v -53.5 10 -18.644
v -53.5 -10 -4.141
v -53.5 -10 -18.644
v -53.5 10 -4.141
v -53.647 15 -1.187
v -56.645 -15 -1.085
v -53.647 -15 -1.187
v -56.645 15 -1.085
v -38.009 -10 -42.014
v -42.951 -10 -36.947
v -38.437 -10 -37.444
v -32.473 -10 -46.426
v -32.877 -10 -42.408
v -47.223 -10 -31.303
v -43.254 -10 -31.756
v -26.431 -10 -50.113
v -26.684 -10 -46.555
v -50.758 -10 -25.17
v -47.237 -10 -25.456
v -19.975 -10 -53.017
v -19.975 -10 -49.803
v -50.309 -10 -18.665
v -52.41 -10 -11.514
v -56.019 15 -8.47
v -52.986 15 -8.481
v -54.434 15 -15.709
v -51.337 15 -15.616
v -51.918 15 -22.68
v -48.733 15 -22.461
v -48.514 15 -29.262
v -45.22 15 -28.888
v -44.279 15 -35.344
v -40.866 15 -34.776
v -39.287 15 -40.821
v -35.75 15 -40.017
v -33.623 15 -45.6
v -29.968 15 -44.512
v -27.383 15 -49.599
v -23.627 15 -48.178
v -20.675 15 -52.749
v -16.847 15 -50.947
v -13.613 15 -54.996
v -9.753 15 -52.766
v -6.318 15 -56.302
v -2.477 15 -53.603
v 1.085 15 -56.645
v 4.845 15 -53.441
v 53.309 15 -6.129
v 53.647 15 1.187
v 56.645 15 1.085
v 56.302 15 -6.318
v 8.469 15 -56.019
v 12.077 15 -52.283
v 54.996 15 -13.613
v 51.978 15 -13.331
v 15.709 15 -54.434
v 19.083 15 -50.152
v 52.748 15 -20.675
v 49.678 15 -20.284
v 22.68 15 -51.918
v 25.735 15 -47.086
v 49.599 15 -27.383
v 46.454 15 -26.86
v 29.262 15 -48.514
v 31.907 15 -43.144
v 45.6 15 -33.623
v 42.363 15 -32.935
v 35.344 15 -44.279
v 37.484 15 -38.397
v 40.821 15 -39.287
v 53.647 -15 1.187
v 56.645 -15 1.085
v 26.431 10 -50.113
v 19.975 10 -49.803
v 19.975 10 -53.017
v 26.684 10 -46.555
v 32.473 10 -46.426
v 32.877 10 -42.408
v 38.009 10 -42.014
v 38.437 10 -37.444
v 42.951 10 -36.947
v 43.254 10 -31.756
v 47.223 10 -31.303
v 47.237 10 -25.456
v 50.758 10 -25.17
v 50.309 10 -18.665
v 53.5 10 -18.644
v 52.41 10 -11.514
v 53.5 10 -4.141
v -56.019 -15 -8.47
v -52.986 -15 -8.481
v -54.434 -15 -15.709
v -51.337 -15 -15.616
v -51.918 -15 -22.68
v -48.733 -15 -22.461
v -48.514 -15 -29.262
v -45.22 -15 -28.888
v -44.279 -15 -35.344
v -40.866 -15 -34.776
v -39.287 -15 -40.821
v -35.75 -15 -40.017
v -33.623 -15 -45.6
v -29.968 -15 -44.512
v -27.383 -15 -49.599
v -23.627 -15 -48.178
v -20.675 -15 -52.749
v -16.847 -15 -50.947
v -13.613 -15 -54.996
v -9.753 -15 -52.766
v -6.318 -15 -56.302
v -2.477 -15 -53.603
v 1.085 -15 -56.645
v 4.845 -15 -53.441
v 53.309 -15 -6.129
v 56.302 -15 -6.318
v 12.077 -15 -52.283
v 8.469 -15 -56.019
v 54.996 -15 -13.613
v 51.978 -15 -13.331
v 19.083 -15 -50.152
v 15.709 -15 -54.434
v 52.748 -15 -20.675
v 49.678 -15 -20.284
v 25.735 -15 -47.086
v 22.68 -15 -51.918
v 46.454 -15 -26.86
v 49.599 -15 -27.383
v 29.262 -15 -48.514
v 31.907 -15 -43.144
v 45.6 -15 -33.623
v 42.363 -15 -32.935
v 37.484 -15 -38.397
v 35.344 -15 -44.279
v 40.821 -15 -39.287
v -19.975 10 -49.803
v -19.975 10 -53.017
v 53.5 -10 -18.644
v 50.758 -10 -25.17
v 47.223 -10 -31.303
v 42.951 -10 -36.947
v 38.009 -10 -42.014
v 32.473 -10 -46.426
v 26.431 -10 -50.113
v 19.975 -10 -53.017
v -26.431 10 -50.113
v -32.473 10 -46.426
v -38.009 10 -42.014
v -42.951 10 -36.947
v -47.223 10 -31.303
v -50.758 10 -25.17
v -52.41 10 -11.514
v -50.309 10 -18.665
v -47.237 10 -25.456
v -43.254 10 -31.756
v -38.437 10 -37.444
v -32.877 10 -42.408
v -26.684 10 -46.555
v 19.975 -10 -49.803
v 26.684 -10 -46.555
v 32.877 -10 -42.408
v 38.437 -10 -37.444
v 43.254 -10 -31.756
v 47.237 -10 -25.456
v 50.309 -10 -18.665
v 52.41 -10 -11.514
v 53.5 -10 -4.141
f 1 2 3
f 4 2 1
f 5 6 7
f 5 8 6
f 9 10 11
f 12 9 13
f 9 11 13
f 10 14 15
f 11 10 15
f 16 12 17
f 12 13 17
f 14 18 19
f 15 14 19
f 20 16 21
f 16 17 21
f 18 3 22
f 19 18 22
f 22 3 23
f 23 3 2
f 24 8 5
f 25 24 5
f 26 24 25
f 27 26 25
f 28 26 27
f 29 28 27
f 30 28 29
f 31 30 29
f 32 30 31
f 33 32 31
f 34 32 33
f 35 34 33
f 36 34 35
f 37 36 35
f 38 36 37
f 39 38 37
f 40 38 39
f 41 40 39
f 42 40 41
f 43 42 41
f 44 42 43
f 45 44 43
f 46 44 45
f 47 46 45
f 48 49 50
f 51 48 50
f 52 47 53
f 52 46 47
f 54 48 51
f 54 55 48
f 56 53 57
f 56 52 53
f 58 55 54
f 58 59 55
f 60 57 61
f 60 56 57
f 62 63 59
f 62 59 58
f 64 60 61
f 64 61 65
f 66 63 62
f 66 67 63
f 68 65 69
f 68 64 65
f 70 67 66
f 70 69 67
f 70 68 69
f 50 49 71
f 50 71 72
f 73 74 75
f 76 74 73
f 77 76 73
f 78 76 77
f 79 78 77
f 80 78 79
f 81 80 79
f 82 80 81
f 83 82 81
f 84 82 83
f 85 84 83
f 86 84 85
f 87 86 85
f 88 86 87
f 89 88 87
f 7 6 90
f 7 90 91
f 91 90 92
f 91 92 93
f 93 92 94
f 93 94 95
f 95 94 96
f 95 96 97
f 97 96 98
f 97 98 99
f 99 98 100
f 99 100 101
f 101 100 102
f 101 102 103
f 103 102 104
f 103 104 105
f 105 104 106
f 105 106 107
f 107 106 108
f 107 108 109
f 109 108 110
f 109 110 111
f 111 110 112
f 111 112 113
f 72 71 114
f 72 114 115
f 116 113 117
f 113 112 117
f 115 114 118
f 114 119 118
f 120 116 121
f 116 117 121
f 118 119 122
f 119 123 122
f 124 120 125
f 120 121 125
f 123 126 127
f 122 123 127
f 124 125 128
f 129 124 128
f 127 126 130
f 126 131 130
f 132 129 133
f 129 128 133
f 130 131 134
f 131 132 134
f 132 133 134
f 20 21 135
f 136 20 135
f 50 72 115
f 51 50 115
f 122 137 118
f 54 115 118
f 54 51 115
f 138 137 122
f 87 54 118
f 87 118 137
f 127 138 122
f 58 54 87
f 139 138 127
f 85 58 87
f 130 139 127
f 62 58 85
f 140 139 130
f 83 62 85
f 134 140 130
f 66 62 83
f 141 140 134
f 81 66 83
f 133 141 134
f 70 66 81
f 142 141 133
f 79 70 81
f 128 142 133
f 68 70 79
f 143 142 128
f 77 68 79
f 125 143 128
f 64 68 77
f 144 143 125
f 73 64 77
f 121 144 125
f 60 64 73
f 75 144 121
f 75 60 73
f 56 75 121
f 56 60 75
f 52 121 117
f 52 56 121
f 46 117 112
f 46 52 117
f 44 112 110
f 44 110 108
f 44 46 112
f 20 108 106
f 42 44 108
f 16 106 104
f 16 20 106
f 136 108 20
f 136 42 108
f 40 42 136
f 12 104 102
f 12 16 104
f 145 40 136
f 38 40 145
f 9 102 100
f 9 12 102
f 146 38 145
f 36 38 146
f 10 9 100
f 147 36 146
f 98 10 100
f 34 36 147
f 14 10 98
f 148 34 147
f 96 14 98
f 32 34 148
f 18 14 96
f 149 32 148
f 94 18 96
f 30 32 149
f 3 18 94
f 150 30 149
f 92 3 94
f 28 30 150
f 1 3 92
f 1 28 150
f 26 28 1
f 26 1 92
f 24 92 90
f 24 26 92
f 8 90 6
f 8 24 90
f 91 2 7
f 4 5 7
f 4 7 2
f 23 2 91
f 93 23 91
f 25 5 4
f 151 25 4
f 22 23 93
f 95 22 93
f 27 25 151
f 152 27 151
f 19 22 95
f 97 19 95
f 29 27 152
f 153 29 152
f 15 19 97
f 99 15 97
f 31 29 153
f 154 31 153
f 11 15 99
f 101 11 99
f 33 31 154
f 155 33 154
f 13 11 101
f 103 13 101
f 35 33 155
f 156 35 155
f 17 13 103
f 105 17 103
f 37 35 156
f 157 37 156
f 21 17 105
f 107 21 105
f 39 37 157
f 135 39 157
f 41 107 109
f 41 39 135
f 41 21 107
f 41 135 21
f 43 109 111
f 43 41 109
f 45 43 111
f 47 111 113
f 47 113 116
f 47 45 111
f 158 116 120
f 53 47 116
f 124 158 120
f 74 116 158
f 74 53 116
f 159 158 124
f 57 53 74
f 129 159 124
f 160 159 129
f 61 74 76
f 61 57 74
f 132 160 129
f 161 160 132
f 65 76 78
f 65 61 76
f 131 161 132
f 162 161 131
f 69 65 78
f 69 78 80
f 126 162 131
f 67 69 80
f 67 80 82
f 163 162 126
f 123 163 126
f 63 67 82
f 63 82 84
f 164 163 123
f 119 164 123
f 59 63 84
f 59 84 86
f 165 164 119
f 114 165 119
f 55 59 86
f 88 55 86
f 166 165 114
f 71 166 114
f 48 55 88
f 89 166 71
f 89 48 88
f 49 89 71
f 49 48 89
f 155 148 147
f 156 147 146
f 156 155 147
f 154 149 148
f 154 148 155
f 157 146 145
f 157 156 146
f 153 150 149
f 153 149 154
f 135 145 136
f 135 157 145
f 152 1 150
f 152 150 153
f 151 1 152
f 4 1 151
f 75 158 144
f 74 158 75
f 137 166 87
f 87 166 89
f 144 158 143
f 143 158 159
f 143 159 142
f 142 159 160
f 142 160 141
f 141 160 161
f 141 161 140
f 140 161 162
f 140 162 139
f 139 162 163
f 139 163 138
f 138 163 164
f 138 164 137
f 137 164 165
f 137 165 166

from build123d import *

# Parameters (mm, degrees)
BOSS_EXTRUDE1_DEPTH = 15
SKETCH4_W           = 33.524511878
SKETCH4_H           = 20
CUT_EXTRUDE2_DEPTH  = 200


with BuildPart() as part:
    # Sketch1 → Boss-Extrude1 (new, symmetric)
    with BuildSketch(Plane(origin=(0, 0, 0), x_dir=(1, 0, 0), z_dir=(0, 1, 0))):
        with BuildLine():
            Line((-56.6451424, 1.085173475), (-53.646875163, 1.186754079))
            ThreePointArc((-53.646875163, 1.186754079), (1.186754079, 53.646875163), (53.646875163, -1.186754079))
            Line((53.646875163, -1.186754079), (56.645146911, -1.084937955))
            ThreePointArc((56.645146911, -1.084937955), (1.085055715, 56.645144656), (-56.6451424, 1.085173475))
        make_face()
    extrude(amount=BOSS_EXTRUDE1_DEPTH, both=True)

    # Sketch4 → Cut-Extrude2 (cut)
    with BuildSketch(Plane.XY):
        with Locations((-36.737744061, 0)):
            Rectangle(SKETCH4_W, SKETCH4_H)
        with Locations((36.737744061, 0)):
            Rectangle(SKETCH4_W, SKETCH4_H)
    extrude(amount=-CUT_EXTRUDE2_DEPTH, mode=Mode.SUBTRACT)


solid = part.part
